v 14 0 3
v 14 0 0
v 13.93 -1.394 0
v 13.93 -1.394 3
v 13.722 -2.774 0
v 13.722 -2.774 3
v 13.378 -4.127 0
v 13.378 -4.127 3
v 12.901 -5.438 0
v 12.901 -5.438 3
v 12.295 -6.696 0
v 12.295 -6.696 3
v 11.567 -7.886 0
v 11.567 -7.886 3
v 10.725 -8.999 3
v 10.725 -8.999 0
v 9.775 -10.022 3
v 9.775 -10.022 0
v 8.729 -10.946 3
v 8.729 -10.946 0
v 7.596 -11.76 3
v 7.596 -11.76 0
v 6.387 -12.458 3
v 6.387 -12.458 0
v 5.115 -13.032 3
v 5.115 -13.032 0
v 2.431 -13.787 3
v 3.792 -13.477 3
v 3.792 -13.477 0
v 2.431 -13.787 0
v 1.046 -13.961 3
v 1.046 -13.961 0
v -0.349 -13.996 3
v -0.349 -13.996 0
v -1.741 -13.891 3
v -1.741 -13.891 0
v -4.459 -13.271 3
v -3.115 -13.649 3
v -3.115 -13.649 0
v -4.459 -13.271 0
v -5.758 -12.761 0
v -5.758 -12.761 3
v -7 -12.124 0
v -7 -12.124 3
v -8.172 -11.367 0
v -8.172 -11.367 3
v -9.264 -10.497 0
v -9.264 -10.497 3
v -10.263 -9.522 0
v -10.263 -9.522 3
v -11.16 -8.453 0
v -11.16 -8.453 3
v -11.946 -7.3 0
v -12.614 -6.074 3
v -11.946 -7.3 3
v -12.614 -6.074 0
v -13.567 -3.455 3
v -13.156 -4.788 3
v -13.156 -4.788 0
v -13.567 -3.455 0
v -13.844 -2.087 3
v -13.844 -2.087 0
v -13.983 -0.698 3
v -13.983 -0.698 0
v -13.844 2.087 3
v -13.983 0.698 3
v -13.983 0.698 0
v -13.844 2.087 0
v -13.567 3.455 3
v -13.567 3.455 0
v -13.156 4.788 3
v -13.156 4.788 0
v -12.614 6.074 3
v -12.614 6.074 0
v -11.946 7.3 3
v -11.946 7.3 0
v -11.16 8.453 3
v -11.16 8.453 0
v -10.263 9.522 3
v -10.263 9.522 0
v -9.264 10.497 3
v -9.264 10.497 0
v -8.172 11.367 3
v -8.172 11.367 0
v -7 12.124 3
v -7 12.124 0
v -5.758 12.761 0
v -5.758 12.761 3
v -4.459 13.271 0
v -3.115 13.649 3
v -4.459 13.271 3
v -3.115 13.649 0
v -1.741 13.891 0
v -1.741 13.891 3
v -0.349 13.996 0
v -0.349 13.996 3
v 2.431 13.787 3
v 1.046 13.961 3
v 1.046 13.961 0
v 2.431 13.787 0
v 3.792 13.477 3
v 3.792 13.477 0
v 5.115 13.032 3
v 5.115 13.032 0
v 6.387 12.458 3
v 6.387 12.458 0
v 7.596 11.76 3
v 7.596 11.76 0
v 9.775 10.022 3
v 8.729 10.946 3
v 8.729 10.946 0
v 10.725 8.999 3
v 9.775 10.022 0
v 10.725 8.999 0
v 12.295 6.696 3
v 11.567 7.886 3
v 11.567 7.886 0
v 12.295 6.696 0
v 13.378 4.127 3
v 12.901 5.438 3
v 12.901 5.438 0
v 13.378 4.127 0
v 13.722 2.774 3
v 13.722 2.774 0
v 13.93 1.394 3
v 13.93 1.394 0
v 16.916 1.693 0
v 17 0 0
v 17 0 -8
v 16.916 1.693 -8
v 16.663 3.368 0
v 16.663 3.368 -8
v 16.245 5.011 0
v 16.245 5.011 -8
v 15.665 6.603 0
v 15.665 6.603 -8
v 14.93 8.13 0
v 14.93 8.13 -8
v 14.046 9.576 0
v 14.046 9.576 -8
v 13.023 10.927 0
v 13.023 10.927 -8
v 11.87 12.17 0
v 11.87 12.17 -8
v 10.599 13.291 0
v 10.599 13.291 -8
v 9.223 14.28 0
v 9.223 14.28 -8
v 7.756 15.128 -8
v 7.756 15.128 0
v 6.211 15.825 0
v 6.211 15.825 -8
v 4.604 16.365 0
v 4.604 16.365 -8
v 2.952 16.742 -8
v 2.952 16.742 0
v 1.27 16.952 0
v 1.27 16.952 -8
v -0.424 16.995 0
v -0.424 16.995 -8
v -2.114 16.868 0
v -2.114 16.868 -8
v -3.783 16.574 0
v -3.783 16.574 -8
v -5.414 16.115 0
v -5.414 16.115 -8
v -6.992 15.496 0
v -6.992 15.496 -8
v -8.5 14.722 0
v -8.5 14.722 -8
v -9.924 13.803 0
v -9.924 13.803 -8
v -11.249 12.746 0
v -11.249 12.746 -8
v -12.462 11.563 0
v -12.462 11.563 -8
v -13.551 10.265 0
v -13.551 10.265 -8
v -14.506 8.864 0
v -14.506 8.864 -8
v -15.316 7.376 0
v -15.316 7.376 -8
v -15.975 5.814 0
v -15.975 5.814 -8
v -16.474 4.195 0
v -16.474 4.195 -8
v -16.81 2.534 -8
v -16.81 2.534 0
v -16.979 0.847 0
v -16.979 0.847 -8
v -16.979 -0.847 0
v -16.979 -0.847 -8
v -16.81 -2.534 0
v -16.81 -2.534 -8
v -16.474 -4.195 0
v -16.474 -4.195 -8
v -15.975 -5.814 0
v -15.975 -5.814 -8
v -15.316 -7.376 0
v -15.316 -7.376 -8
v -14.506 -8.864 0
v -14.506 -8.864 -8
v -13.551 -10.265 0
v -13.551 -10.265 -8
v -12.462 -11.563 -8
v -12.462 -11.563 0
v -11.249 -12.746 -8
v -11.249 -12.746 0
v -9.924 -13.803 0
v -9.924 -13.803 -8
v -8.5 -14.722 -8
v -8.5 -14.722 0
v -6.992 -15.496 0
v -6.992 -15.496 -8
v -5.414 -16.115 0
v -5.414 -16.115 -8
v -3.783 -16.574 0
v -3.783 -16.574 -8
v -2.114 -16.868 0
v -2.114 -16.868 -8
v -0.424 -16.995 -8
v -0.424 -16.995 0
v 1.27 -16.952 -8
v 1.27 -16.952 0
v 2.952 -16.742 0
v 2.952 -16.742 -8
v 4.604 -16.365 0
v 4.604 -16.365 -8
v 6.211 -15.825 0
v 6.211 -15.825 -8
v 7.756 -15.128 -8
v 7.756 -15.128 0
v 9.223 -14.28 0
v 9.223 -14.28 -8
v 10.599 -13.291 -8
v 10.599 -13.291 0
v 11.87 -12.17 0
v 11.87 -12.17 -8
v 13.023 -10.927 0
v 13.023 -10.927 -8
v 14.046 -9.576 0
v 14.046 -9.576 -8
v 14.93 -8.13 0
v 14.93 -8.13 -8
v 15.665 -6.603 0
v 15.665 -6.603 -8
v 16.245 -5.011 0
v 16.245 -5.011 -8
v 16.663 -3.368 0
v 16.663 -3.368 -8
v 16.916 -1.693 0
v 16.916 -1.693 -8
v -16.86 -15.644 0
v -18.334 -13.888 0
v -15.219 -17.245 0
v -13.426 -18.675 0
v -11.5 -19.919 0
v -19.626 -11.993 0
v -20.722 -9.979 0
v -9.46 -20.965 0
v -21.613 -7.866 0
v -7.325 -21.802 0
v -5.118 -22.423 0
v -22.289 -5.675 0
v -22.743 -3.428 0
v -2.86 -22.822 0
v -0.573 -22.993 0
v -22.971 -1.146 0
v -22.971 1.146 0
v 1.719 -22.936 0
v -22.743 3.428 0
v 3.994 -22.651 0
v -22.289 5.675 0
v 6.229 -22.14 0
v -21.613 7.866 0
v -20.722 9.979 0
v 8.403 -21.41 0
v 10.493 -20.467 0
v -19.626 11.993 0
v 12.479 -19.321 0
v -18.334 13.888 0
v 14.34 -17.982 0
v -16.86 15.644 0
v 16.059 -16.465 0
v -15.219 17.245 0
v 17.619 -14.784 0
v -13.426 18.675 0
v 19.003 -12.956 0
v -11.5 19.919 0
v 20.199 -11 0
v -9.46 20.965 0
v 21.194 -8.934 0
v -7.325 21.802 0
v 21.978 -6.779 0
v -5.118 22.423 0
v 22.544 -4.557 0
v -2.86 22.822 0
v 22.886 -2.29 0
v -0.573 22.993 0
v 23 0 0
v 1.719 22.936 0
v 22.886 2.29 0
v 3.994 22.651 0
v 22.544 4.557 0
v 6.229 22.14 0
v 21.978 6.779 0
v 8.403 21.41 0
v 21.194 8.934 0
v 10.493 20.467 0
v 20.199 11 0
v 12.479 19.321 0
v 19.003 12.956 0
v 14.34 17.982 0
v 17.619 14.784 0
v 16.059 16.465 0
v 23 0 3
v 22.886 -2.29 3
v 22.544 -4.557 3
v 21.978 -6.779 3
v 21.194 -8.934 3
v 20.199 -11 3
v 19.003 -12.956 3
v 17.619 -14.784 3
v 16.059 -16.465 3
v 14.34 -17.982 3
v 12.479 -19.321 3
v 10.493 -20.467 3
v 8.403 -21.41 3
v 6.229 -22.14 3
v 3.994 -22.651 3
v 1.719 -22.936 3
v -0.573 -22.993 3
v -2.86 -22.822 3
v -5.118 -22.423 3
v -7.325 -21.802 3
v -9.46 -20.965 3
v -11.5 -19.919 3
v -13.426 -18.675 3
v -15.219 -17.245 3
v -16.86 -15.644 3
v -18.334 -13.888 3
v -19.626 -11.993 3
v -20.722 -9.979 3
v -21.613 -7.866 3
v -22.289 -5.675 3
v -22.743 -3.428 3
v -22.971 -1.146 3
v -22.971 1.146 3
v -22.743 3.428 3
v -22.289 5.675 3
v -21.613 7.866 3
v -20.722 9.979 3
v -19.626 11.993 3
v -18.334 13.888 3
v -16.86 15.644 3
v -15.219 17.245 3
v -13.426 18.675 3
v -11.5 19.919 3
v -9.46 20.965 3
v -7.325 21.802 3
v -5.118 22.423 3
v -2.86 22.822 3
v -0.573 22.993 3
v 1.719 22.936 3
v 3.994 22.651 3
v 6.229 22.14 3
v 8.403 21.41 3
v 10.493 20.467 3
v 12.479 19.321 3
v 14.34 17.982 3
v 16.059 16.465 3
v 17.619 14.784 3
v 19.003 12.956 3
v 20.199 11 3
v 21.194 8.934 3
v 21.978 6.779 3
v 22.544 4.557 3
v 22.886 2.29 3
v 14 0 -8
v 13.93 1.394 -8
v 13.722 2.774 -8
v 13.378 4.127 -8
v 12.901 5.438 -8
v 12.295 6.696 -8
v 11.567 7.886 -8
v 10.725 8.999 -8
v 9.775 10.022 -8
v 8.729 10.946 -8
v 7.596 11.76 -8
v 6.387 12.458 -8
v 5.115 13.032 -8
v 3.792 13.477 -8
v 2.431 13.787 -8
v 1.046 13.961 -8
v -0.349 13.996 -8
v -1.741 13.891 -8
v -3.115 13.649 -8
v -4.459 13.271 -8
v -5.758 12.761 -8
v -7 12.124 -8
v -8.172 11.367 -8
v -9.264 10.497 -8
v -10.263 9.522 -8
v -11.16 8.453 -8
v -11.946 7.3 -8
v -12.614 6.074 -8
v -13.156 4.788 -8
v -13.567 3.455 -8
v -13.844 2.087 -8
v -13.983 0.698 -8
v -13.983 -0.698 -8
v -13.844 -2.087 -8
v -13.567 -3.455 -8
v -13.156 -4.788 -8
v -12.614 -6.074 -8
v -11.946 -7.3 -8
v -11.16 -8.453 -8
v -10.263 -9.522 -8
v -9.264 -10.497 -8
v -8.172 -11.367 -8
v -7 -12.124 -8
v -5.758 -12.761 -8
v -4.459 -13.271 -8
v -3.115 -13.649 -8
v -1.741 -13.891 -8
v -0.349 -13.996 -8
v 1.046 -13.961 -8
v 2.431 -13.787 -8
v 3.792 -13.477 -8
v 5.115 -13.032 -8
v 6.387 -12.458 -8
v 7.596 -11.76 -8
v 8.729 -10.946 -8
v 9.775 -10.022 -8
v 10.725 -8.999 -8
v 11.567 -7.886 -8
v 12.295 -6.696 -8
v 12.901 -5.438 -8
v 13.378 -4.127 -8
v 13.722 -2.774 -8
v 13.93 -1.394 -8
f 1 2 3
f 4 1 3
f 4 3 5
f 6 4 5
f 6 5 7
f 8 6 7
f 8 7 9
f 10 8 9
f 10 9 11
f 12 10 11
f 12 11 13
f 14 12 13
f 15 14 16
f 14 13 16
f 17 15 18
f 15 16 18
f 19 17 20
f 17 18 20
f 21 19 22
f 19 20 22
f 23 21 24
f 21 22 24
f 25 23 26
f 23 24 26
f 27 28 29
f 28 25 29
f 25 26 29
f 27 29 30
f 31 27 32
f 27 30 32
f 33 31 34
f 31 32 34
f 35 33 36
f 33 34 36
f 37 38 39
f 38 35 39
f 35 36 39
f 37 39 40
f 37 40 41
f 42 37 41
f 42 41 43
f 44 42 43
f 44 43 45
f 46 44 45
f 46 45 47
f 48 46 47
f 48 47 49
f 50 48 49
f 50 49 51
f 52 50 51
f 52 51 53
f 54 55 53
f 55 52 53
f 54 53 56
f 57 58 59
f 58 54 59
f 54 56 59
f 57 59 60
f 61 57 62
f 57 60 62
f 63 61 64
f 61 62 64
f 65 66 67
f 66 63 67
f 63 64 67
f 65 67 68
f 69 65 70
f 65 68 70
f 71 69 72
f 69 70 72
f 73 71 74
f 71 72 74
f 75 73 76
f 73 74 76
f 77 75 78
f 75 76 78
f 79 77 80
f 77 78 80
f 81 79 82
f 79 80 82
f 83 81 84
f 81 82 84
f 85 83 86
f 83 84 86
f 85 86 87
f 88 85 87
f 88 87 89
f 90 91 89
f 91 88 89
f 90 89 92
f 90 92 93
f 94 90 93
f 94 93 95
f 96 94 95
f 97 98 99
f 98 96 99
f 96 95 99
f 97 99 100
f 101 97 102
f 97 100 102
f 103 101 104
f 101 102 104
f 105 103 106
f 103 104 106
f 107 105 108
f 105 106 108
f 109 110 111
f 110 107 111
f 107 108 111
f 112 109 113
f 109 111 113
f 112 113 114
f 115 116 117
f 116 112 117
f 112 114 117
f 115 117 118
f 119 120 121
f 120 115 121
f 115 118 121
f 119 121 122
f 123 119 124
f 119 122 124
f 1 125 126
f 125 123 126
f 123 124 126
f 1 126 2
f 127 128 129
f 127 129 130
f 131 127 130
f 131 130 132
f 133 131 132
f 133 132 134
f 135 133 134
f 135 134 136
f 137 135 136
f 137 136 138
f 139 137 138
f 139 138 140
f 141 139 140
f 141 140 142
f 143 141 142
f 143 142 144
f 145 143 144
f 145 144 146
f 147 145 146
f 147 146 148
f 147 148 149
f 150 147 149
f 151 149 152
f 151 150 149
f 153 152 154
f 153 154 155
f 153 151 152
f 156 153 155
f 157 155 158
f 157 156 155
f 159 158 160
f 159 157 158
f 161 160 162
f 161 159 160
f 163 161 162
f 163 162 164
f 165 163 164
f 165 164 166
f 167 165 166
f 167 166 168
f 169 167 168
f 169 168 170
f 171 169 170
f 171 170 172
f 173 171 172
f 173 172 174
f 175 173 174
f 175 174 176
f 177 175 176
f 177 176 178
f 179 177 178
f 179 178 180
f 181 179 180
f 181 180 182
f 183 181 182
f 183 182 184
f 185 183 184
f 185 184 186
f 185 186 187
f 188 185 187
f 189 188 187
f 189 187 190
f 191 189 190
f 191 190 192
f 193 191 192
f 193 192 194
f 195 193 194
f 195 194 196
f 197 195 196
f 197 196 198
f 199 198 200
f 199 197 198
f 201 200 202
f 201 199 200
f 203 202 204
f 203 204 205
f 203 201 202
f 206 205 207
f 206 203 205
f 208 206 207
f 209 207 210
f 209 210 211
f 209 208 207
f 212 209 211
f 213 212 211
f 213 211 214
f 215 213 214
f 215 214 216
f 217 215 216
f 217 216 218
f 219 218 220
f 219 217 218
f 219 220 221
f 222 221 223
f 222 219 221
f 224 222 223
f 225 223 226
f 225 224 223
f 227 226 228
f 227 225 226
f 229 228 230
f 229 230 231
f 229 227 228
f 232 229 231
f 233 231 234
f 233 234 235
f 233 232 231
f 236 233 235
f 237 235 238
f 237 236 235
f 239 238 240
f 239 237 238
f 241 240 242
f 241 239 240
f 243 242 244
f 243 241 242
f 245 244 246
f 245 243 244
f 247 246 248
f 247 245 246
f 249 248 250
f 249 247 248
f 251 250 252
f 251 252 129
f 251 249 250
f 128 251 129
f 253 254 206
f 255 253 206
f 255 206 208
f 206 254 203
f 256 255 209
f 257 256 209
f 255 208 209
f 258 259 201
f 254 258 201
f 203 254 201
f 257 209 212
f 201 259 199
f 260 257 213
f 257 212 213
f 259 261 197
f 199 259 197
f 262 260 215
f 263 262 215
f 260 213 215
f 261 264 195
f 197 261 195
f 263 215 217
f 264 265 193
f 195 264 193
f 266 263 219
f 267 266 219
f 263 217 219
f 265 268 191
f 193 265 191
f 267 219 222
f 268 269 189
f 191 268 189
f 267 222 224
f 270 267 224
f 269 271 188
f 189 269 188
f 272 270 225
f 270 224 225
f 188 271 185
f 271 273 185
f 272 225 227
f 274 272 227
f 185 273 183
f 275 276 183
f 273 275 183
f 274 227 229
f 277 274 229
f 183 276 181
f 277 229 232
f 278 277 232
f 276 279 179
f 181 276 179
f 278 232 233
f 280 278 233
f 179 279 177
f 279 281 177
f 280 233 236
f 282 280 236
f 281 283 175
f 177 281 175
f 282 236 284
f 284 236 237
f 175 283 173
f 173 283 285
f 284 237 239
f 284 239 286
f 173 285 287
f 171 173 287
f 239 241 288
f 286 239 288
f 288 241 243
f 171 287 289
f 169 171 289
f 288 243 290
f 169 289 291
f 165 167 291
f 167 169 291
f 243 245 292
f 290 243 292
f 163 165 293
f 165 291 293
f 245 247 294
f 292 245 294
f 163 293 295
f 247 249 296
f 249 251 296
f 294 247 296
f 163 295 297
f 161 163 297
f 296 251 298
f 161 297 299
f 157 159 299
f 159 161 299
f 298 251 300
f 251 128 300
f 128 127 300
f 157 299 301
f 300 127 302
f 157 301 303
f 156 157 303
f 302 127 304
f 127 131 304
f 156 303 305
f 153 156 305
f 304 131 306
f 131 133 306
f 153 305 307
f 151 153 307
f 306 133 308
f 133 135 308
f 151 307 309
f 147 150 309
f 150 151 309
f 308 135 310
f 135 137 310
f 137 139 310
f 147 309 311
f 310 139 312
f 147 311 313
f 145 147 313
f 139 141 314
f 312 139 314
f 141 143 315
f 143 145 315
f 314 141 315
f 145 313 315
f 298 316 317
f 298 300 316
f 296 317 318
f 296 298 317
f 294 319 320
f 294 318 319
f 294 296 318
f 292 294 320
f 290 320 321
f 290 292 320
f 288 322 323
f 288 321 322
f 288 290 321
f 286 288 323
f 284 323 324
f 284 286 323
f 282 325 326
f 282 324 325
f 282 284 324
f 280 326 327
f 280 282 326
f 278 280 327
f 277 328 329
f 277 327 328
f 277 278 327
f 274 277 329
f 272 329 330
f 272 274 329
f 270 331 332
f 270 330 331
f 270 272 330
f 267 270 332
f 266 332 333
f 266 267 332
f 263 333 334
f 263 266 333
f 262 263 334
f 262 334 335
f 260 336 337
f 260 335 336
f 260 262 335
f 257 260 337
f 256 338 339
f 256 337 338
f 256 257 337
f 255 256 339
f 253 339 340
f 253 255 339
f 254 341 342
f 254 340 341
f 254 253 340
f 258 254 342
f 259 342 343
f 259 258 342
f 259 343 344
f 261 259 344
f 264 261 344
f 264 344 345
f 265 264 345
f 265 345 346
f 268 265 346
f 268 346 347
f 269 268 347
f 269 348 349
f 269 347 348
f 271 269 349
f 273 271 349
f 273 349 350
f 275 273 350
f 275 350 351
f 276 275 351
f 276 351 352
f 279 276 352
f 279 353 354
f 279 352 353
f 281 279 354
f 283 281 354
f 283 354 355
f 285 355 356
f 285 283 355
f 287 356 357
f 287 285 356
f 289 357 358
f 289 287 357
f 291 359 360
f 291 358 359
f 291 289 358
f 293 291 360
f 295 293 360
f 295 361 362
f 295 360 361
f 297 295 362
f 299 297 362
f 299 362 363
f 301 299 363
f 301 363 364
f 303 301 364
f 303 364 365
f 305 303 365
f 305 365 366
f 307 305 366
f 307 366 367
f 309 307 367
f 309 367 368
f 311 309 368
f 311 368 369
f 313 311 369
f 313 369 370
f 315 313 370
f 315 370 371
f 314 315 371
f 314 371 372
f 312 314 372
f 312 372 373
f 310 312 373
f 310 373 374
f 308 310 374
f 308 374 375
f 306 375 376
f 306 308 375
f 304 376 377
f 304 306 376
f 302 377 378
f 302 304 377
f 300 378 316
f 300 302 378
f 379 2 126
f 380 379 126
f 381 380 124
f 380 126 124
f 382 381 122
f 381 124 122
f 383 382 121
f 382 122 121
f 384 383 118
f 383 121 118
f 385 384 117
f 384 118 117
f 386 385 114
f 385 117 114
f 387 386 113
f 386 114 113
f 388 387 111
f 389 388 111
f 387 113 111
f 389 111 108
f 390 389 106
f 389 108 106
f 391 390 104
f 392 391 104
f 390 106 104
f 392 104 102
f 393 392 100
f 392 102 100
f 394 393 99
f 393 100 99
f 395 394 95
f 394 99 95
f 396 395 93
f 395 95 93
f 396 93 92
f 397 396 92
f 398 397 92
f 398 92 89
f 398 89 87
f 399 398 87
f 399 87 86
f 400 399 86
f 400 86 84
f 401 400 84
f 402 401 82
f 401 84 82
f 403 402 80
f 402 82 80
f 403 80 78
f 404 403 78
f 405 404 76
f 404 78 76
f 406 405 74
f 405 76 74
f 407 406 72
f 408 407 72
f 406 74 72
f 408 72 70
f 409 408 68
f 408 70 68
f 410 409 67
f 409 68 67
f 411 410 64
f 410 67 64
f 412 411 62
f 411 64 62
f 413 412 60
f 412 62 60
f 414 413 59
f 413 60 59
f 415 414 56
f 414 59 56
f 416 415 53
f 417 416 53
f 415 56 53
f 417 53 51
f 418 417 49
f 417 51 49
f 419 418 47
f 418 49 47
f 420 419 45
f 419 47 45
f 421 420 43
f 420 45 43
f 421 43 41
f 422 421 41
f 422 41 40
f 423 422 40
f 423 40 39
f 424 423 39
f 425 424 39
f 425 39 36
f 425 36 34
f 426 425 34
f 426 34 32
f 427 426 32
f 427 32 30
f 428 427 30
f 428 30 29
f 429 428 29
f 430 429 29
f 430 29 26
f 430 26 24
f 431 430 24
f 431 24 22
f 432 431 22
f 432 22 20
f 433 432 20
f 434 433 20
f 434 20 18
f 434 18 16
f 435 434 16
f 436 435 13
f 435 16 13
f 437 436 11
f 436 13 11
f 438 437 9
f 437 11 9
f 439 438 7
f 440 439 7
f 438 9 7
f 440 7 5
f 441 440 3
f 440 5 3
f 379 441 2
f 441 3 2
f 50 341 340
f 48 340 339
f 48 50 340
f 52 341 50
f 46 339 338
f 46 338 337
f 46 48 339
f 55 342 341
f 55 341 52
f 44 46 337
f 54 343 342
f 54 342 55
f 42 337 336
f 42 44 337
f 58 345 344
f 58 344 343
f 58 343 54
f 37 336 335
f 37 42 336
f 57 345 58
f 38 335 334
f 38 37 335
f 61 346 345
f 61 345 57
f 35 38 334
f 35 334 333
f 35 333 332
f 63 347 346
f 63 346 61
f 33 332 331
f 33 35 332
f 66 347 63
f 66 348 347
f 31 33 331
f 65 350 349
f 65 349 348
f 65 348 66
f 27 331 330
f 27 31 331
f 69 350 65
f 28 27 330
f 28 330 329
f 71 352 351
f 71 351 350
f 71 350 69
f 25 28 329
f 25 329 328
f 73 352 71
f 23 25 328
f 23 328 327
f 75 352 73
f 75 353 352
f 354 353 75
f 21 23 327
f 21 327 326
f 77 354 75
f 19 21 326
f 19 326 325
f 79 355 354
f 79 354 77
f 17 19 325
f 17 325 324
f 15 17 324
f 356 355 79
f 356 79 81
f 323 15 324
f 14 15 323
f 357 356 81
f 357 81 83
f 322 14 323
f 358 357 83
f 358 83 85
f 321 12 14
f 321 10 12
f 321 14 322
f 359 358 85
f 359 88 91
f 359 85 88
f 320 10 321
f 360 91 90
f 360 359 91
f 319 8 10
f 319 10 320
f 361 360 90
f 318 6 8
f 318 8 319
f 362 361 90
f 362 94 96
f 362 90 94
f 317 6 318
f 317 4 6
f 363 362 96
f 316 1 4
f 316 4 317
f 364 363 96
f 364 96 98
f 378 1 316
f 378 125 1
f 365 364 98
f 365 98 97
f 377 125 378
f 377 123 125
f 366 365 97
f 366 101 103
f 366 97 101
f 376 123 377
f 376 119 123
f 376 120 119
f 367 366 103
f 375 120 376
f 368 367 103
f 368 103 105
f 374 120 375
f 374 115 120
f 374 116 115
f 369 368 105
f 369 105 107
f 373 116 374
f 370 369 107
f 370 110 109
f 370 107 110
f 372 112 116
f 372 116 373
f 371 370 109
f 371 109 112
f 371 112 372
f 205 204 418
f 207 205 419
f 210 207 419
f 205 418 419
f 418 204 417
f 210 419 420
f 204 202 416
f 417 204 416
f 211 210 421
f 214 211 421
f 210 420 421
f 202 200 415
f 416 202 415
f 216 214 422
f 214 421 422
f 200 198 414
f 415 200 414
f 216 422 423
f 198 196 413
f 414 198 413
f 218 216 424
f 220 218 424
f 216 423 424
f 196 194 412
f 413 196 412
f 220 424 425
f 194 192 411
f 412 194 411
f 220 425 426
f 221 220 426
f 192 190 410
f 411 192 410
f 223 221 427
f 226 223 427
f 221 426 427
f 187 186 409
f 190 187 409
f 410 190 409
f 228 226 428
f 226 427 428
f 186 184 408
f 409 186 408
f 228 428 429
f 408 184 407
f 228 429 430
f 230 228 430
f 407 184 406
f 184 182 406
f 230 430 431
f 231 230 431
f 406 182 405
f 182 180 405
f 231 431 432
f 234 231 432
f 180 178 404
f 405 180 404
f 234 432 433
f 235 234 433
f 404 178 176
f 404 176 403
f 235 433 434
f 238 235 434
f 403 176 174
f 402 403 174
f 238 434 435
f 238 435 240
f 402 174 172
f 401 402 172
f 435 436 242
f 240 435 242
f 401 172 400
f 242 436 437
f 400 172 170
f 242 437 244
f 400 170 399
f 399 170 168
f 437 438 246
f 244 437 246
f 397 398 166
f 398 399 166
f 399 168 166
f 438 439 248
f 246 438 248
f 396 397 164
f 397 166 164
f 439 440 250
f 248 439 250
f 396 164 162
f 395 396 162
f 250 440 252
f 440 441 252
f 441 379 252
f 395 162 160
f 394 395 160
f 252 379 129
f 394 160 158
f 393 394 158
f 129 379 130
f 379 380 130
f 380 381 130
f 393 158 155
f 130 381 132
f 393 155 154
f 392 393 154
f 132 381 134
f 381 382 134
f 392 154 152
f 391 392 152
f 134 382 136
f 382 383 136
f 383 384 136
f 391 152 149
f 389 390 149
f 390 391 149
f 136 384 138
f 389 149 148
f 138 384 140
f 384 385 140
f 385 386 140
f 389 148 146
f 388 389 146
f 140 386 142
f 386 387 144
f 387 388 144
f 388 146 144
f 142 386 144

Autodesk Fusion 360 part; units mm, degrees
sketch "Sketch1" plane through (0, 0, 0) normal (0, 0, 1) x (1, 0, 0)
  circle A0 centre (0, 0) radius 23
  circle A1 centre (0, 0) radius 14
  circle A2 centre (0, 0) radius 17
  dimension "d1" = 46
  dimension "d2" = 28
  dimension "d3" = 34
extrude "Extrude1" add sketch "Sketch1" along normal blind 3 contours A0 | A2
extrude "Extrude2" add sketch "Sketch1" against normal blind 8 contours A2
